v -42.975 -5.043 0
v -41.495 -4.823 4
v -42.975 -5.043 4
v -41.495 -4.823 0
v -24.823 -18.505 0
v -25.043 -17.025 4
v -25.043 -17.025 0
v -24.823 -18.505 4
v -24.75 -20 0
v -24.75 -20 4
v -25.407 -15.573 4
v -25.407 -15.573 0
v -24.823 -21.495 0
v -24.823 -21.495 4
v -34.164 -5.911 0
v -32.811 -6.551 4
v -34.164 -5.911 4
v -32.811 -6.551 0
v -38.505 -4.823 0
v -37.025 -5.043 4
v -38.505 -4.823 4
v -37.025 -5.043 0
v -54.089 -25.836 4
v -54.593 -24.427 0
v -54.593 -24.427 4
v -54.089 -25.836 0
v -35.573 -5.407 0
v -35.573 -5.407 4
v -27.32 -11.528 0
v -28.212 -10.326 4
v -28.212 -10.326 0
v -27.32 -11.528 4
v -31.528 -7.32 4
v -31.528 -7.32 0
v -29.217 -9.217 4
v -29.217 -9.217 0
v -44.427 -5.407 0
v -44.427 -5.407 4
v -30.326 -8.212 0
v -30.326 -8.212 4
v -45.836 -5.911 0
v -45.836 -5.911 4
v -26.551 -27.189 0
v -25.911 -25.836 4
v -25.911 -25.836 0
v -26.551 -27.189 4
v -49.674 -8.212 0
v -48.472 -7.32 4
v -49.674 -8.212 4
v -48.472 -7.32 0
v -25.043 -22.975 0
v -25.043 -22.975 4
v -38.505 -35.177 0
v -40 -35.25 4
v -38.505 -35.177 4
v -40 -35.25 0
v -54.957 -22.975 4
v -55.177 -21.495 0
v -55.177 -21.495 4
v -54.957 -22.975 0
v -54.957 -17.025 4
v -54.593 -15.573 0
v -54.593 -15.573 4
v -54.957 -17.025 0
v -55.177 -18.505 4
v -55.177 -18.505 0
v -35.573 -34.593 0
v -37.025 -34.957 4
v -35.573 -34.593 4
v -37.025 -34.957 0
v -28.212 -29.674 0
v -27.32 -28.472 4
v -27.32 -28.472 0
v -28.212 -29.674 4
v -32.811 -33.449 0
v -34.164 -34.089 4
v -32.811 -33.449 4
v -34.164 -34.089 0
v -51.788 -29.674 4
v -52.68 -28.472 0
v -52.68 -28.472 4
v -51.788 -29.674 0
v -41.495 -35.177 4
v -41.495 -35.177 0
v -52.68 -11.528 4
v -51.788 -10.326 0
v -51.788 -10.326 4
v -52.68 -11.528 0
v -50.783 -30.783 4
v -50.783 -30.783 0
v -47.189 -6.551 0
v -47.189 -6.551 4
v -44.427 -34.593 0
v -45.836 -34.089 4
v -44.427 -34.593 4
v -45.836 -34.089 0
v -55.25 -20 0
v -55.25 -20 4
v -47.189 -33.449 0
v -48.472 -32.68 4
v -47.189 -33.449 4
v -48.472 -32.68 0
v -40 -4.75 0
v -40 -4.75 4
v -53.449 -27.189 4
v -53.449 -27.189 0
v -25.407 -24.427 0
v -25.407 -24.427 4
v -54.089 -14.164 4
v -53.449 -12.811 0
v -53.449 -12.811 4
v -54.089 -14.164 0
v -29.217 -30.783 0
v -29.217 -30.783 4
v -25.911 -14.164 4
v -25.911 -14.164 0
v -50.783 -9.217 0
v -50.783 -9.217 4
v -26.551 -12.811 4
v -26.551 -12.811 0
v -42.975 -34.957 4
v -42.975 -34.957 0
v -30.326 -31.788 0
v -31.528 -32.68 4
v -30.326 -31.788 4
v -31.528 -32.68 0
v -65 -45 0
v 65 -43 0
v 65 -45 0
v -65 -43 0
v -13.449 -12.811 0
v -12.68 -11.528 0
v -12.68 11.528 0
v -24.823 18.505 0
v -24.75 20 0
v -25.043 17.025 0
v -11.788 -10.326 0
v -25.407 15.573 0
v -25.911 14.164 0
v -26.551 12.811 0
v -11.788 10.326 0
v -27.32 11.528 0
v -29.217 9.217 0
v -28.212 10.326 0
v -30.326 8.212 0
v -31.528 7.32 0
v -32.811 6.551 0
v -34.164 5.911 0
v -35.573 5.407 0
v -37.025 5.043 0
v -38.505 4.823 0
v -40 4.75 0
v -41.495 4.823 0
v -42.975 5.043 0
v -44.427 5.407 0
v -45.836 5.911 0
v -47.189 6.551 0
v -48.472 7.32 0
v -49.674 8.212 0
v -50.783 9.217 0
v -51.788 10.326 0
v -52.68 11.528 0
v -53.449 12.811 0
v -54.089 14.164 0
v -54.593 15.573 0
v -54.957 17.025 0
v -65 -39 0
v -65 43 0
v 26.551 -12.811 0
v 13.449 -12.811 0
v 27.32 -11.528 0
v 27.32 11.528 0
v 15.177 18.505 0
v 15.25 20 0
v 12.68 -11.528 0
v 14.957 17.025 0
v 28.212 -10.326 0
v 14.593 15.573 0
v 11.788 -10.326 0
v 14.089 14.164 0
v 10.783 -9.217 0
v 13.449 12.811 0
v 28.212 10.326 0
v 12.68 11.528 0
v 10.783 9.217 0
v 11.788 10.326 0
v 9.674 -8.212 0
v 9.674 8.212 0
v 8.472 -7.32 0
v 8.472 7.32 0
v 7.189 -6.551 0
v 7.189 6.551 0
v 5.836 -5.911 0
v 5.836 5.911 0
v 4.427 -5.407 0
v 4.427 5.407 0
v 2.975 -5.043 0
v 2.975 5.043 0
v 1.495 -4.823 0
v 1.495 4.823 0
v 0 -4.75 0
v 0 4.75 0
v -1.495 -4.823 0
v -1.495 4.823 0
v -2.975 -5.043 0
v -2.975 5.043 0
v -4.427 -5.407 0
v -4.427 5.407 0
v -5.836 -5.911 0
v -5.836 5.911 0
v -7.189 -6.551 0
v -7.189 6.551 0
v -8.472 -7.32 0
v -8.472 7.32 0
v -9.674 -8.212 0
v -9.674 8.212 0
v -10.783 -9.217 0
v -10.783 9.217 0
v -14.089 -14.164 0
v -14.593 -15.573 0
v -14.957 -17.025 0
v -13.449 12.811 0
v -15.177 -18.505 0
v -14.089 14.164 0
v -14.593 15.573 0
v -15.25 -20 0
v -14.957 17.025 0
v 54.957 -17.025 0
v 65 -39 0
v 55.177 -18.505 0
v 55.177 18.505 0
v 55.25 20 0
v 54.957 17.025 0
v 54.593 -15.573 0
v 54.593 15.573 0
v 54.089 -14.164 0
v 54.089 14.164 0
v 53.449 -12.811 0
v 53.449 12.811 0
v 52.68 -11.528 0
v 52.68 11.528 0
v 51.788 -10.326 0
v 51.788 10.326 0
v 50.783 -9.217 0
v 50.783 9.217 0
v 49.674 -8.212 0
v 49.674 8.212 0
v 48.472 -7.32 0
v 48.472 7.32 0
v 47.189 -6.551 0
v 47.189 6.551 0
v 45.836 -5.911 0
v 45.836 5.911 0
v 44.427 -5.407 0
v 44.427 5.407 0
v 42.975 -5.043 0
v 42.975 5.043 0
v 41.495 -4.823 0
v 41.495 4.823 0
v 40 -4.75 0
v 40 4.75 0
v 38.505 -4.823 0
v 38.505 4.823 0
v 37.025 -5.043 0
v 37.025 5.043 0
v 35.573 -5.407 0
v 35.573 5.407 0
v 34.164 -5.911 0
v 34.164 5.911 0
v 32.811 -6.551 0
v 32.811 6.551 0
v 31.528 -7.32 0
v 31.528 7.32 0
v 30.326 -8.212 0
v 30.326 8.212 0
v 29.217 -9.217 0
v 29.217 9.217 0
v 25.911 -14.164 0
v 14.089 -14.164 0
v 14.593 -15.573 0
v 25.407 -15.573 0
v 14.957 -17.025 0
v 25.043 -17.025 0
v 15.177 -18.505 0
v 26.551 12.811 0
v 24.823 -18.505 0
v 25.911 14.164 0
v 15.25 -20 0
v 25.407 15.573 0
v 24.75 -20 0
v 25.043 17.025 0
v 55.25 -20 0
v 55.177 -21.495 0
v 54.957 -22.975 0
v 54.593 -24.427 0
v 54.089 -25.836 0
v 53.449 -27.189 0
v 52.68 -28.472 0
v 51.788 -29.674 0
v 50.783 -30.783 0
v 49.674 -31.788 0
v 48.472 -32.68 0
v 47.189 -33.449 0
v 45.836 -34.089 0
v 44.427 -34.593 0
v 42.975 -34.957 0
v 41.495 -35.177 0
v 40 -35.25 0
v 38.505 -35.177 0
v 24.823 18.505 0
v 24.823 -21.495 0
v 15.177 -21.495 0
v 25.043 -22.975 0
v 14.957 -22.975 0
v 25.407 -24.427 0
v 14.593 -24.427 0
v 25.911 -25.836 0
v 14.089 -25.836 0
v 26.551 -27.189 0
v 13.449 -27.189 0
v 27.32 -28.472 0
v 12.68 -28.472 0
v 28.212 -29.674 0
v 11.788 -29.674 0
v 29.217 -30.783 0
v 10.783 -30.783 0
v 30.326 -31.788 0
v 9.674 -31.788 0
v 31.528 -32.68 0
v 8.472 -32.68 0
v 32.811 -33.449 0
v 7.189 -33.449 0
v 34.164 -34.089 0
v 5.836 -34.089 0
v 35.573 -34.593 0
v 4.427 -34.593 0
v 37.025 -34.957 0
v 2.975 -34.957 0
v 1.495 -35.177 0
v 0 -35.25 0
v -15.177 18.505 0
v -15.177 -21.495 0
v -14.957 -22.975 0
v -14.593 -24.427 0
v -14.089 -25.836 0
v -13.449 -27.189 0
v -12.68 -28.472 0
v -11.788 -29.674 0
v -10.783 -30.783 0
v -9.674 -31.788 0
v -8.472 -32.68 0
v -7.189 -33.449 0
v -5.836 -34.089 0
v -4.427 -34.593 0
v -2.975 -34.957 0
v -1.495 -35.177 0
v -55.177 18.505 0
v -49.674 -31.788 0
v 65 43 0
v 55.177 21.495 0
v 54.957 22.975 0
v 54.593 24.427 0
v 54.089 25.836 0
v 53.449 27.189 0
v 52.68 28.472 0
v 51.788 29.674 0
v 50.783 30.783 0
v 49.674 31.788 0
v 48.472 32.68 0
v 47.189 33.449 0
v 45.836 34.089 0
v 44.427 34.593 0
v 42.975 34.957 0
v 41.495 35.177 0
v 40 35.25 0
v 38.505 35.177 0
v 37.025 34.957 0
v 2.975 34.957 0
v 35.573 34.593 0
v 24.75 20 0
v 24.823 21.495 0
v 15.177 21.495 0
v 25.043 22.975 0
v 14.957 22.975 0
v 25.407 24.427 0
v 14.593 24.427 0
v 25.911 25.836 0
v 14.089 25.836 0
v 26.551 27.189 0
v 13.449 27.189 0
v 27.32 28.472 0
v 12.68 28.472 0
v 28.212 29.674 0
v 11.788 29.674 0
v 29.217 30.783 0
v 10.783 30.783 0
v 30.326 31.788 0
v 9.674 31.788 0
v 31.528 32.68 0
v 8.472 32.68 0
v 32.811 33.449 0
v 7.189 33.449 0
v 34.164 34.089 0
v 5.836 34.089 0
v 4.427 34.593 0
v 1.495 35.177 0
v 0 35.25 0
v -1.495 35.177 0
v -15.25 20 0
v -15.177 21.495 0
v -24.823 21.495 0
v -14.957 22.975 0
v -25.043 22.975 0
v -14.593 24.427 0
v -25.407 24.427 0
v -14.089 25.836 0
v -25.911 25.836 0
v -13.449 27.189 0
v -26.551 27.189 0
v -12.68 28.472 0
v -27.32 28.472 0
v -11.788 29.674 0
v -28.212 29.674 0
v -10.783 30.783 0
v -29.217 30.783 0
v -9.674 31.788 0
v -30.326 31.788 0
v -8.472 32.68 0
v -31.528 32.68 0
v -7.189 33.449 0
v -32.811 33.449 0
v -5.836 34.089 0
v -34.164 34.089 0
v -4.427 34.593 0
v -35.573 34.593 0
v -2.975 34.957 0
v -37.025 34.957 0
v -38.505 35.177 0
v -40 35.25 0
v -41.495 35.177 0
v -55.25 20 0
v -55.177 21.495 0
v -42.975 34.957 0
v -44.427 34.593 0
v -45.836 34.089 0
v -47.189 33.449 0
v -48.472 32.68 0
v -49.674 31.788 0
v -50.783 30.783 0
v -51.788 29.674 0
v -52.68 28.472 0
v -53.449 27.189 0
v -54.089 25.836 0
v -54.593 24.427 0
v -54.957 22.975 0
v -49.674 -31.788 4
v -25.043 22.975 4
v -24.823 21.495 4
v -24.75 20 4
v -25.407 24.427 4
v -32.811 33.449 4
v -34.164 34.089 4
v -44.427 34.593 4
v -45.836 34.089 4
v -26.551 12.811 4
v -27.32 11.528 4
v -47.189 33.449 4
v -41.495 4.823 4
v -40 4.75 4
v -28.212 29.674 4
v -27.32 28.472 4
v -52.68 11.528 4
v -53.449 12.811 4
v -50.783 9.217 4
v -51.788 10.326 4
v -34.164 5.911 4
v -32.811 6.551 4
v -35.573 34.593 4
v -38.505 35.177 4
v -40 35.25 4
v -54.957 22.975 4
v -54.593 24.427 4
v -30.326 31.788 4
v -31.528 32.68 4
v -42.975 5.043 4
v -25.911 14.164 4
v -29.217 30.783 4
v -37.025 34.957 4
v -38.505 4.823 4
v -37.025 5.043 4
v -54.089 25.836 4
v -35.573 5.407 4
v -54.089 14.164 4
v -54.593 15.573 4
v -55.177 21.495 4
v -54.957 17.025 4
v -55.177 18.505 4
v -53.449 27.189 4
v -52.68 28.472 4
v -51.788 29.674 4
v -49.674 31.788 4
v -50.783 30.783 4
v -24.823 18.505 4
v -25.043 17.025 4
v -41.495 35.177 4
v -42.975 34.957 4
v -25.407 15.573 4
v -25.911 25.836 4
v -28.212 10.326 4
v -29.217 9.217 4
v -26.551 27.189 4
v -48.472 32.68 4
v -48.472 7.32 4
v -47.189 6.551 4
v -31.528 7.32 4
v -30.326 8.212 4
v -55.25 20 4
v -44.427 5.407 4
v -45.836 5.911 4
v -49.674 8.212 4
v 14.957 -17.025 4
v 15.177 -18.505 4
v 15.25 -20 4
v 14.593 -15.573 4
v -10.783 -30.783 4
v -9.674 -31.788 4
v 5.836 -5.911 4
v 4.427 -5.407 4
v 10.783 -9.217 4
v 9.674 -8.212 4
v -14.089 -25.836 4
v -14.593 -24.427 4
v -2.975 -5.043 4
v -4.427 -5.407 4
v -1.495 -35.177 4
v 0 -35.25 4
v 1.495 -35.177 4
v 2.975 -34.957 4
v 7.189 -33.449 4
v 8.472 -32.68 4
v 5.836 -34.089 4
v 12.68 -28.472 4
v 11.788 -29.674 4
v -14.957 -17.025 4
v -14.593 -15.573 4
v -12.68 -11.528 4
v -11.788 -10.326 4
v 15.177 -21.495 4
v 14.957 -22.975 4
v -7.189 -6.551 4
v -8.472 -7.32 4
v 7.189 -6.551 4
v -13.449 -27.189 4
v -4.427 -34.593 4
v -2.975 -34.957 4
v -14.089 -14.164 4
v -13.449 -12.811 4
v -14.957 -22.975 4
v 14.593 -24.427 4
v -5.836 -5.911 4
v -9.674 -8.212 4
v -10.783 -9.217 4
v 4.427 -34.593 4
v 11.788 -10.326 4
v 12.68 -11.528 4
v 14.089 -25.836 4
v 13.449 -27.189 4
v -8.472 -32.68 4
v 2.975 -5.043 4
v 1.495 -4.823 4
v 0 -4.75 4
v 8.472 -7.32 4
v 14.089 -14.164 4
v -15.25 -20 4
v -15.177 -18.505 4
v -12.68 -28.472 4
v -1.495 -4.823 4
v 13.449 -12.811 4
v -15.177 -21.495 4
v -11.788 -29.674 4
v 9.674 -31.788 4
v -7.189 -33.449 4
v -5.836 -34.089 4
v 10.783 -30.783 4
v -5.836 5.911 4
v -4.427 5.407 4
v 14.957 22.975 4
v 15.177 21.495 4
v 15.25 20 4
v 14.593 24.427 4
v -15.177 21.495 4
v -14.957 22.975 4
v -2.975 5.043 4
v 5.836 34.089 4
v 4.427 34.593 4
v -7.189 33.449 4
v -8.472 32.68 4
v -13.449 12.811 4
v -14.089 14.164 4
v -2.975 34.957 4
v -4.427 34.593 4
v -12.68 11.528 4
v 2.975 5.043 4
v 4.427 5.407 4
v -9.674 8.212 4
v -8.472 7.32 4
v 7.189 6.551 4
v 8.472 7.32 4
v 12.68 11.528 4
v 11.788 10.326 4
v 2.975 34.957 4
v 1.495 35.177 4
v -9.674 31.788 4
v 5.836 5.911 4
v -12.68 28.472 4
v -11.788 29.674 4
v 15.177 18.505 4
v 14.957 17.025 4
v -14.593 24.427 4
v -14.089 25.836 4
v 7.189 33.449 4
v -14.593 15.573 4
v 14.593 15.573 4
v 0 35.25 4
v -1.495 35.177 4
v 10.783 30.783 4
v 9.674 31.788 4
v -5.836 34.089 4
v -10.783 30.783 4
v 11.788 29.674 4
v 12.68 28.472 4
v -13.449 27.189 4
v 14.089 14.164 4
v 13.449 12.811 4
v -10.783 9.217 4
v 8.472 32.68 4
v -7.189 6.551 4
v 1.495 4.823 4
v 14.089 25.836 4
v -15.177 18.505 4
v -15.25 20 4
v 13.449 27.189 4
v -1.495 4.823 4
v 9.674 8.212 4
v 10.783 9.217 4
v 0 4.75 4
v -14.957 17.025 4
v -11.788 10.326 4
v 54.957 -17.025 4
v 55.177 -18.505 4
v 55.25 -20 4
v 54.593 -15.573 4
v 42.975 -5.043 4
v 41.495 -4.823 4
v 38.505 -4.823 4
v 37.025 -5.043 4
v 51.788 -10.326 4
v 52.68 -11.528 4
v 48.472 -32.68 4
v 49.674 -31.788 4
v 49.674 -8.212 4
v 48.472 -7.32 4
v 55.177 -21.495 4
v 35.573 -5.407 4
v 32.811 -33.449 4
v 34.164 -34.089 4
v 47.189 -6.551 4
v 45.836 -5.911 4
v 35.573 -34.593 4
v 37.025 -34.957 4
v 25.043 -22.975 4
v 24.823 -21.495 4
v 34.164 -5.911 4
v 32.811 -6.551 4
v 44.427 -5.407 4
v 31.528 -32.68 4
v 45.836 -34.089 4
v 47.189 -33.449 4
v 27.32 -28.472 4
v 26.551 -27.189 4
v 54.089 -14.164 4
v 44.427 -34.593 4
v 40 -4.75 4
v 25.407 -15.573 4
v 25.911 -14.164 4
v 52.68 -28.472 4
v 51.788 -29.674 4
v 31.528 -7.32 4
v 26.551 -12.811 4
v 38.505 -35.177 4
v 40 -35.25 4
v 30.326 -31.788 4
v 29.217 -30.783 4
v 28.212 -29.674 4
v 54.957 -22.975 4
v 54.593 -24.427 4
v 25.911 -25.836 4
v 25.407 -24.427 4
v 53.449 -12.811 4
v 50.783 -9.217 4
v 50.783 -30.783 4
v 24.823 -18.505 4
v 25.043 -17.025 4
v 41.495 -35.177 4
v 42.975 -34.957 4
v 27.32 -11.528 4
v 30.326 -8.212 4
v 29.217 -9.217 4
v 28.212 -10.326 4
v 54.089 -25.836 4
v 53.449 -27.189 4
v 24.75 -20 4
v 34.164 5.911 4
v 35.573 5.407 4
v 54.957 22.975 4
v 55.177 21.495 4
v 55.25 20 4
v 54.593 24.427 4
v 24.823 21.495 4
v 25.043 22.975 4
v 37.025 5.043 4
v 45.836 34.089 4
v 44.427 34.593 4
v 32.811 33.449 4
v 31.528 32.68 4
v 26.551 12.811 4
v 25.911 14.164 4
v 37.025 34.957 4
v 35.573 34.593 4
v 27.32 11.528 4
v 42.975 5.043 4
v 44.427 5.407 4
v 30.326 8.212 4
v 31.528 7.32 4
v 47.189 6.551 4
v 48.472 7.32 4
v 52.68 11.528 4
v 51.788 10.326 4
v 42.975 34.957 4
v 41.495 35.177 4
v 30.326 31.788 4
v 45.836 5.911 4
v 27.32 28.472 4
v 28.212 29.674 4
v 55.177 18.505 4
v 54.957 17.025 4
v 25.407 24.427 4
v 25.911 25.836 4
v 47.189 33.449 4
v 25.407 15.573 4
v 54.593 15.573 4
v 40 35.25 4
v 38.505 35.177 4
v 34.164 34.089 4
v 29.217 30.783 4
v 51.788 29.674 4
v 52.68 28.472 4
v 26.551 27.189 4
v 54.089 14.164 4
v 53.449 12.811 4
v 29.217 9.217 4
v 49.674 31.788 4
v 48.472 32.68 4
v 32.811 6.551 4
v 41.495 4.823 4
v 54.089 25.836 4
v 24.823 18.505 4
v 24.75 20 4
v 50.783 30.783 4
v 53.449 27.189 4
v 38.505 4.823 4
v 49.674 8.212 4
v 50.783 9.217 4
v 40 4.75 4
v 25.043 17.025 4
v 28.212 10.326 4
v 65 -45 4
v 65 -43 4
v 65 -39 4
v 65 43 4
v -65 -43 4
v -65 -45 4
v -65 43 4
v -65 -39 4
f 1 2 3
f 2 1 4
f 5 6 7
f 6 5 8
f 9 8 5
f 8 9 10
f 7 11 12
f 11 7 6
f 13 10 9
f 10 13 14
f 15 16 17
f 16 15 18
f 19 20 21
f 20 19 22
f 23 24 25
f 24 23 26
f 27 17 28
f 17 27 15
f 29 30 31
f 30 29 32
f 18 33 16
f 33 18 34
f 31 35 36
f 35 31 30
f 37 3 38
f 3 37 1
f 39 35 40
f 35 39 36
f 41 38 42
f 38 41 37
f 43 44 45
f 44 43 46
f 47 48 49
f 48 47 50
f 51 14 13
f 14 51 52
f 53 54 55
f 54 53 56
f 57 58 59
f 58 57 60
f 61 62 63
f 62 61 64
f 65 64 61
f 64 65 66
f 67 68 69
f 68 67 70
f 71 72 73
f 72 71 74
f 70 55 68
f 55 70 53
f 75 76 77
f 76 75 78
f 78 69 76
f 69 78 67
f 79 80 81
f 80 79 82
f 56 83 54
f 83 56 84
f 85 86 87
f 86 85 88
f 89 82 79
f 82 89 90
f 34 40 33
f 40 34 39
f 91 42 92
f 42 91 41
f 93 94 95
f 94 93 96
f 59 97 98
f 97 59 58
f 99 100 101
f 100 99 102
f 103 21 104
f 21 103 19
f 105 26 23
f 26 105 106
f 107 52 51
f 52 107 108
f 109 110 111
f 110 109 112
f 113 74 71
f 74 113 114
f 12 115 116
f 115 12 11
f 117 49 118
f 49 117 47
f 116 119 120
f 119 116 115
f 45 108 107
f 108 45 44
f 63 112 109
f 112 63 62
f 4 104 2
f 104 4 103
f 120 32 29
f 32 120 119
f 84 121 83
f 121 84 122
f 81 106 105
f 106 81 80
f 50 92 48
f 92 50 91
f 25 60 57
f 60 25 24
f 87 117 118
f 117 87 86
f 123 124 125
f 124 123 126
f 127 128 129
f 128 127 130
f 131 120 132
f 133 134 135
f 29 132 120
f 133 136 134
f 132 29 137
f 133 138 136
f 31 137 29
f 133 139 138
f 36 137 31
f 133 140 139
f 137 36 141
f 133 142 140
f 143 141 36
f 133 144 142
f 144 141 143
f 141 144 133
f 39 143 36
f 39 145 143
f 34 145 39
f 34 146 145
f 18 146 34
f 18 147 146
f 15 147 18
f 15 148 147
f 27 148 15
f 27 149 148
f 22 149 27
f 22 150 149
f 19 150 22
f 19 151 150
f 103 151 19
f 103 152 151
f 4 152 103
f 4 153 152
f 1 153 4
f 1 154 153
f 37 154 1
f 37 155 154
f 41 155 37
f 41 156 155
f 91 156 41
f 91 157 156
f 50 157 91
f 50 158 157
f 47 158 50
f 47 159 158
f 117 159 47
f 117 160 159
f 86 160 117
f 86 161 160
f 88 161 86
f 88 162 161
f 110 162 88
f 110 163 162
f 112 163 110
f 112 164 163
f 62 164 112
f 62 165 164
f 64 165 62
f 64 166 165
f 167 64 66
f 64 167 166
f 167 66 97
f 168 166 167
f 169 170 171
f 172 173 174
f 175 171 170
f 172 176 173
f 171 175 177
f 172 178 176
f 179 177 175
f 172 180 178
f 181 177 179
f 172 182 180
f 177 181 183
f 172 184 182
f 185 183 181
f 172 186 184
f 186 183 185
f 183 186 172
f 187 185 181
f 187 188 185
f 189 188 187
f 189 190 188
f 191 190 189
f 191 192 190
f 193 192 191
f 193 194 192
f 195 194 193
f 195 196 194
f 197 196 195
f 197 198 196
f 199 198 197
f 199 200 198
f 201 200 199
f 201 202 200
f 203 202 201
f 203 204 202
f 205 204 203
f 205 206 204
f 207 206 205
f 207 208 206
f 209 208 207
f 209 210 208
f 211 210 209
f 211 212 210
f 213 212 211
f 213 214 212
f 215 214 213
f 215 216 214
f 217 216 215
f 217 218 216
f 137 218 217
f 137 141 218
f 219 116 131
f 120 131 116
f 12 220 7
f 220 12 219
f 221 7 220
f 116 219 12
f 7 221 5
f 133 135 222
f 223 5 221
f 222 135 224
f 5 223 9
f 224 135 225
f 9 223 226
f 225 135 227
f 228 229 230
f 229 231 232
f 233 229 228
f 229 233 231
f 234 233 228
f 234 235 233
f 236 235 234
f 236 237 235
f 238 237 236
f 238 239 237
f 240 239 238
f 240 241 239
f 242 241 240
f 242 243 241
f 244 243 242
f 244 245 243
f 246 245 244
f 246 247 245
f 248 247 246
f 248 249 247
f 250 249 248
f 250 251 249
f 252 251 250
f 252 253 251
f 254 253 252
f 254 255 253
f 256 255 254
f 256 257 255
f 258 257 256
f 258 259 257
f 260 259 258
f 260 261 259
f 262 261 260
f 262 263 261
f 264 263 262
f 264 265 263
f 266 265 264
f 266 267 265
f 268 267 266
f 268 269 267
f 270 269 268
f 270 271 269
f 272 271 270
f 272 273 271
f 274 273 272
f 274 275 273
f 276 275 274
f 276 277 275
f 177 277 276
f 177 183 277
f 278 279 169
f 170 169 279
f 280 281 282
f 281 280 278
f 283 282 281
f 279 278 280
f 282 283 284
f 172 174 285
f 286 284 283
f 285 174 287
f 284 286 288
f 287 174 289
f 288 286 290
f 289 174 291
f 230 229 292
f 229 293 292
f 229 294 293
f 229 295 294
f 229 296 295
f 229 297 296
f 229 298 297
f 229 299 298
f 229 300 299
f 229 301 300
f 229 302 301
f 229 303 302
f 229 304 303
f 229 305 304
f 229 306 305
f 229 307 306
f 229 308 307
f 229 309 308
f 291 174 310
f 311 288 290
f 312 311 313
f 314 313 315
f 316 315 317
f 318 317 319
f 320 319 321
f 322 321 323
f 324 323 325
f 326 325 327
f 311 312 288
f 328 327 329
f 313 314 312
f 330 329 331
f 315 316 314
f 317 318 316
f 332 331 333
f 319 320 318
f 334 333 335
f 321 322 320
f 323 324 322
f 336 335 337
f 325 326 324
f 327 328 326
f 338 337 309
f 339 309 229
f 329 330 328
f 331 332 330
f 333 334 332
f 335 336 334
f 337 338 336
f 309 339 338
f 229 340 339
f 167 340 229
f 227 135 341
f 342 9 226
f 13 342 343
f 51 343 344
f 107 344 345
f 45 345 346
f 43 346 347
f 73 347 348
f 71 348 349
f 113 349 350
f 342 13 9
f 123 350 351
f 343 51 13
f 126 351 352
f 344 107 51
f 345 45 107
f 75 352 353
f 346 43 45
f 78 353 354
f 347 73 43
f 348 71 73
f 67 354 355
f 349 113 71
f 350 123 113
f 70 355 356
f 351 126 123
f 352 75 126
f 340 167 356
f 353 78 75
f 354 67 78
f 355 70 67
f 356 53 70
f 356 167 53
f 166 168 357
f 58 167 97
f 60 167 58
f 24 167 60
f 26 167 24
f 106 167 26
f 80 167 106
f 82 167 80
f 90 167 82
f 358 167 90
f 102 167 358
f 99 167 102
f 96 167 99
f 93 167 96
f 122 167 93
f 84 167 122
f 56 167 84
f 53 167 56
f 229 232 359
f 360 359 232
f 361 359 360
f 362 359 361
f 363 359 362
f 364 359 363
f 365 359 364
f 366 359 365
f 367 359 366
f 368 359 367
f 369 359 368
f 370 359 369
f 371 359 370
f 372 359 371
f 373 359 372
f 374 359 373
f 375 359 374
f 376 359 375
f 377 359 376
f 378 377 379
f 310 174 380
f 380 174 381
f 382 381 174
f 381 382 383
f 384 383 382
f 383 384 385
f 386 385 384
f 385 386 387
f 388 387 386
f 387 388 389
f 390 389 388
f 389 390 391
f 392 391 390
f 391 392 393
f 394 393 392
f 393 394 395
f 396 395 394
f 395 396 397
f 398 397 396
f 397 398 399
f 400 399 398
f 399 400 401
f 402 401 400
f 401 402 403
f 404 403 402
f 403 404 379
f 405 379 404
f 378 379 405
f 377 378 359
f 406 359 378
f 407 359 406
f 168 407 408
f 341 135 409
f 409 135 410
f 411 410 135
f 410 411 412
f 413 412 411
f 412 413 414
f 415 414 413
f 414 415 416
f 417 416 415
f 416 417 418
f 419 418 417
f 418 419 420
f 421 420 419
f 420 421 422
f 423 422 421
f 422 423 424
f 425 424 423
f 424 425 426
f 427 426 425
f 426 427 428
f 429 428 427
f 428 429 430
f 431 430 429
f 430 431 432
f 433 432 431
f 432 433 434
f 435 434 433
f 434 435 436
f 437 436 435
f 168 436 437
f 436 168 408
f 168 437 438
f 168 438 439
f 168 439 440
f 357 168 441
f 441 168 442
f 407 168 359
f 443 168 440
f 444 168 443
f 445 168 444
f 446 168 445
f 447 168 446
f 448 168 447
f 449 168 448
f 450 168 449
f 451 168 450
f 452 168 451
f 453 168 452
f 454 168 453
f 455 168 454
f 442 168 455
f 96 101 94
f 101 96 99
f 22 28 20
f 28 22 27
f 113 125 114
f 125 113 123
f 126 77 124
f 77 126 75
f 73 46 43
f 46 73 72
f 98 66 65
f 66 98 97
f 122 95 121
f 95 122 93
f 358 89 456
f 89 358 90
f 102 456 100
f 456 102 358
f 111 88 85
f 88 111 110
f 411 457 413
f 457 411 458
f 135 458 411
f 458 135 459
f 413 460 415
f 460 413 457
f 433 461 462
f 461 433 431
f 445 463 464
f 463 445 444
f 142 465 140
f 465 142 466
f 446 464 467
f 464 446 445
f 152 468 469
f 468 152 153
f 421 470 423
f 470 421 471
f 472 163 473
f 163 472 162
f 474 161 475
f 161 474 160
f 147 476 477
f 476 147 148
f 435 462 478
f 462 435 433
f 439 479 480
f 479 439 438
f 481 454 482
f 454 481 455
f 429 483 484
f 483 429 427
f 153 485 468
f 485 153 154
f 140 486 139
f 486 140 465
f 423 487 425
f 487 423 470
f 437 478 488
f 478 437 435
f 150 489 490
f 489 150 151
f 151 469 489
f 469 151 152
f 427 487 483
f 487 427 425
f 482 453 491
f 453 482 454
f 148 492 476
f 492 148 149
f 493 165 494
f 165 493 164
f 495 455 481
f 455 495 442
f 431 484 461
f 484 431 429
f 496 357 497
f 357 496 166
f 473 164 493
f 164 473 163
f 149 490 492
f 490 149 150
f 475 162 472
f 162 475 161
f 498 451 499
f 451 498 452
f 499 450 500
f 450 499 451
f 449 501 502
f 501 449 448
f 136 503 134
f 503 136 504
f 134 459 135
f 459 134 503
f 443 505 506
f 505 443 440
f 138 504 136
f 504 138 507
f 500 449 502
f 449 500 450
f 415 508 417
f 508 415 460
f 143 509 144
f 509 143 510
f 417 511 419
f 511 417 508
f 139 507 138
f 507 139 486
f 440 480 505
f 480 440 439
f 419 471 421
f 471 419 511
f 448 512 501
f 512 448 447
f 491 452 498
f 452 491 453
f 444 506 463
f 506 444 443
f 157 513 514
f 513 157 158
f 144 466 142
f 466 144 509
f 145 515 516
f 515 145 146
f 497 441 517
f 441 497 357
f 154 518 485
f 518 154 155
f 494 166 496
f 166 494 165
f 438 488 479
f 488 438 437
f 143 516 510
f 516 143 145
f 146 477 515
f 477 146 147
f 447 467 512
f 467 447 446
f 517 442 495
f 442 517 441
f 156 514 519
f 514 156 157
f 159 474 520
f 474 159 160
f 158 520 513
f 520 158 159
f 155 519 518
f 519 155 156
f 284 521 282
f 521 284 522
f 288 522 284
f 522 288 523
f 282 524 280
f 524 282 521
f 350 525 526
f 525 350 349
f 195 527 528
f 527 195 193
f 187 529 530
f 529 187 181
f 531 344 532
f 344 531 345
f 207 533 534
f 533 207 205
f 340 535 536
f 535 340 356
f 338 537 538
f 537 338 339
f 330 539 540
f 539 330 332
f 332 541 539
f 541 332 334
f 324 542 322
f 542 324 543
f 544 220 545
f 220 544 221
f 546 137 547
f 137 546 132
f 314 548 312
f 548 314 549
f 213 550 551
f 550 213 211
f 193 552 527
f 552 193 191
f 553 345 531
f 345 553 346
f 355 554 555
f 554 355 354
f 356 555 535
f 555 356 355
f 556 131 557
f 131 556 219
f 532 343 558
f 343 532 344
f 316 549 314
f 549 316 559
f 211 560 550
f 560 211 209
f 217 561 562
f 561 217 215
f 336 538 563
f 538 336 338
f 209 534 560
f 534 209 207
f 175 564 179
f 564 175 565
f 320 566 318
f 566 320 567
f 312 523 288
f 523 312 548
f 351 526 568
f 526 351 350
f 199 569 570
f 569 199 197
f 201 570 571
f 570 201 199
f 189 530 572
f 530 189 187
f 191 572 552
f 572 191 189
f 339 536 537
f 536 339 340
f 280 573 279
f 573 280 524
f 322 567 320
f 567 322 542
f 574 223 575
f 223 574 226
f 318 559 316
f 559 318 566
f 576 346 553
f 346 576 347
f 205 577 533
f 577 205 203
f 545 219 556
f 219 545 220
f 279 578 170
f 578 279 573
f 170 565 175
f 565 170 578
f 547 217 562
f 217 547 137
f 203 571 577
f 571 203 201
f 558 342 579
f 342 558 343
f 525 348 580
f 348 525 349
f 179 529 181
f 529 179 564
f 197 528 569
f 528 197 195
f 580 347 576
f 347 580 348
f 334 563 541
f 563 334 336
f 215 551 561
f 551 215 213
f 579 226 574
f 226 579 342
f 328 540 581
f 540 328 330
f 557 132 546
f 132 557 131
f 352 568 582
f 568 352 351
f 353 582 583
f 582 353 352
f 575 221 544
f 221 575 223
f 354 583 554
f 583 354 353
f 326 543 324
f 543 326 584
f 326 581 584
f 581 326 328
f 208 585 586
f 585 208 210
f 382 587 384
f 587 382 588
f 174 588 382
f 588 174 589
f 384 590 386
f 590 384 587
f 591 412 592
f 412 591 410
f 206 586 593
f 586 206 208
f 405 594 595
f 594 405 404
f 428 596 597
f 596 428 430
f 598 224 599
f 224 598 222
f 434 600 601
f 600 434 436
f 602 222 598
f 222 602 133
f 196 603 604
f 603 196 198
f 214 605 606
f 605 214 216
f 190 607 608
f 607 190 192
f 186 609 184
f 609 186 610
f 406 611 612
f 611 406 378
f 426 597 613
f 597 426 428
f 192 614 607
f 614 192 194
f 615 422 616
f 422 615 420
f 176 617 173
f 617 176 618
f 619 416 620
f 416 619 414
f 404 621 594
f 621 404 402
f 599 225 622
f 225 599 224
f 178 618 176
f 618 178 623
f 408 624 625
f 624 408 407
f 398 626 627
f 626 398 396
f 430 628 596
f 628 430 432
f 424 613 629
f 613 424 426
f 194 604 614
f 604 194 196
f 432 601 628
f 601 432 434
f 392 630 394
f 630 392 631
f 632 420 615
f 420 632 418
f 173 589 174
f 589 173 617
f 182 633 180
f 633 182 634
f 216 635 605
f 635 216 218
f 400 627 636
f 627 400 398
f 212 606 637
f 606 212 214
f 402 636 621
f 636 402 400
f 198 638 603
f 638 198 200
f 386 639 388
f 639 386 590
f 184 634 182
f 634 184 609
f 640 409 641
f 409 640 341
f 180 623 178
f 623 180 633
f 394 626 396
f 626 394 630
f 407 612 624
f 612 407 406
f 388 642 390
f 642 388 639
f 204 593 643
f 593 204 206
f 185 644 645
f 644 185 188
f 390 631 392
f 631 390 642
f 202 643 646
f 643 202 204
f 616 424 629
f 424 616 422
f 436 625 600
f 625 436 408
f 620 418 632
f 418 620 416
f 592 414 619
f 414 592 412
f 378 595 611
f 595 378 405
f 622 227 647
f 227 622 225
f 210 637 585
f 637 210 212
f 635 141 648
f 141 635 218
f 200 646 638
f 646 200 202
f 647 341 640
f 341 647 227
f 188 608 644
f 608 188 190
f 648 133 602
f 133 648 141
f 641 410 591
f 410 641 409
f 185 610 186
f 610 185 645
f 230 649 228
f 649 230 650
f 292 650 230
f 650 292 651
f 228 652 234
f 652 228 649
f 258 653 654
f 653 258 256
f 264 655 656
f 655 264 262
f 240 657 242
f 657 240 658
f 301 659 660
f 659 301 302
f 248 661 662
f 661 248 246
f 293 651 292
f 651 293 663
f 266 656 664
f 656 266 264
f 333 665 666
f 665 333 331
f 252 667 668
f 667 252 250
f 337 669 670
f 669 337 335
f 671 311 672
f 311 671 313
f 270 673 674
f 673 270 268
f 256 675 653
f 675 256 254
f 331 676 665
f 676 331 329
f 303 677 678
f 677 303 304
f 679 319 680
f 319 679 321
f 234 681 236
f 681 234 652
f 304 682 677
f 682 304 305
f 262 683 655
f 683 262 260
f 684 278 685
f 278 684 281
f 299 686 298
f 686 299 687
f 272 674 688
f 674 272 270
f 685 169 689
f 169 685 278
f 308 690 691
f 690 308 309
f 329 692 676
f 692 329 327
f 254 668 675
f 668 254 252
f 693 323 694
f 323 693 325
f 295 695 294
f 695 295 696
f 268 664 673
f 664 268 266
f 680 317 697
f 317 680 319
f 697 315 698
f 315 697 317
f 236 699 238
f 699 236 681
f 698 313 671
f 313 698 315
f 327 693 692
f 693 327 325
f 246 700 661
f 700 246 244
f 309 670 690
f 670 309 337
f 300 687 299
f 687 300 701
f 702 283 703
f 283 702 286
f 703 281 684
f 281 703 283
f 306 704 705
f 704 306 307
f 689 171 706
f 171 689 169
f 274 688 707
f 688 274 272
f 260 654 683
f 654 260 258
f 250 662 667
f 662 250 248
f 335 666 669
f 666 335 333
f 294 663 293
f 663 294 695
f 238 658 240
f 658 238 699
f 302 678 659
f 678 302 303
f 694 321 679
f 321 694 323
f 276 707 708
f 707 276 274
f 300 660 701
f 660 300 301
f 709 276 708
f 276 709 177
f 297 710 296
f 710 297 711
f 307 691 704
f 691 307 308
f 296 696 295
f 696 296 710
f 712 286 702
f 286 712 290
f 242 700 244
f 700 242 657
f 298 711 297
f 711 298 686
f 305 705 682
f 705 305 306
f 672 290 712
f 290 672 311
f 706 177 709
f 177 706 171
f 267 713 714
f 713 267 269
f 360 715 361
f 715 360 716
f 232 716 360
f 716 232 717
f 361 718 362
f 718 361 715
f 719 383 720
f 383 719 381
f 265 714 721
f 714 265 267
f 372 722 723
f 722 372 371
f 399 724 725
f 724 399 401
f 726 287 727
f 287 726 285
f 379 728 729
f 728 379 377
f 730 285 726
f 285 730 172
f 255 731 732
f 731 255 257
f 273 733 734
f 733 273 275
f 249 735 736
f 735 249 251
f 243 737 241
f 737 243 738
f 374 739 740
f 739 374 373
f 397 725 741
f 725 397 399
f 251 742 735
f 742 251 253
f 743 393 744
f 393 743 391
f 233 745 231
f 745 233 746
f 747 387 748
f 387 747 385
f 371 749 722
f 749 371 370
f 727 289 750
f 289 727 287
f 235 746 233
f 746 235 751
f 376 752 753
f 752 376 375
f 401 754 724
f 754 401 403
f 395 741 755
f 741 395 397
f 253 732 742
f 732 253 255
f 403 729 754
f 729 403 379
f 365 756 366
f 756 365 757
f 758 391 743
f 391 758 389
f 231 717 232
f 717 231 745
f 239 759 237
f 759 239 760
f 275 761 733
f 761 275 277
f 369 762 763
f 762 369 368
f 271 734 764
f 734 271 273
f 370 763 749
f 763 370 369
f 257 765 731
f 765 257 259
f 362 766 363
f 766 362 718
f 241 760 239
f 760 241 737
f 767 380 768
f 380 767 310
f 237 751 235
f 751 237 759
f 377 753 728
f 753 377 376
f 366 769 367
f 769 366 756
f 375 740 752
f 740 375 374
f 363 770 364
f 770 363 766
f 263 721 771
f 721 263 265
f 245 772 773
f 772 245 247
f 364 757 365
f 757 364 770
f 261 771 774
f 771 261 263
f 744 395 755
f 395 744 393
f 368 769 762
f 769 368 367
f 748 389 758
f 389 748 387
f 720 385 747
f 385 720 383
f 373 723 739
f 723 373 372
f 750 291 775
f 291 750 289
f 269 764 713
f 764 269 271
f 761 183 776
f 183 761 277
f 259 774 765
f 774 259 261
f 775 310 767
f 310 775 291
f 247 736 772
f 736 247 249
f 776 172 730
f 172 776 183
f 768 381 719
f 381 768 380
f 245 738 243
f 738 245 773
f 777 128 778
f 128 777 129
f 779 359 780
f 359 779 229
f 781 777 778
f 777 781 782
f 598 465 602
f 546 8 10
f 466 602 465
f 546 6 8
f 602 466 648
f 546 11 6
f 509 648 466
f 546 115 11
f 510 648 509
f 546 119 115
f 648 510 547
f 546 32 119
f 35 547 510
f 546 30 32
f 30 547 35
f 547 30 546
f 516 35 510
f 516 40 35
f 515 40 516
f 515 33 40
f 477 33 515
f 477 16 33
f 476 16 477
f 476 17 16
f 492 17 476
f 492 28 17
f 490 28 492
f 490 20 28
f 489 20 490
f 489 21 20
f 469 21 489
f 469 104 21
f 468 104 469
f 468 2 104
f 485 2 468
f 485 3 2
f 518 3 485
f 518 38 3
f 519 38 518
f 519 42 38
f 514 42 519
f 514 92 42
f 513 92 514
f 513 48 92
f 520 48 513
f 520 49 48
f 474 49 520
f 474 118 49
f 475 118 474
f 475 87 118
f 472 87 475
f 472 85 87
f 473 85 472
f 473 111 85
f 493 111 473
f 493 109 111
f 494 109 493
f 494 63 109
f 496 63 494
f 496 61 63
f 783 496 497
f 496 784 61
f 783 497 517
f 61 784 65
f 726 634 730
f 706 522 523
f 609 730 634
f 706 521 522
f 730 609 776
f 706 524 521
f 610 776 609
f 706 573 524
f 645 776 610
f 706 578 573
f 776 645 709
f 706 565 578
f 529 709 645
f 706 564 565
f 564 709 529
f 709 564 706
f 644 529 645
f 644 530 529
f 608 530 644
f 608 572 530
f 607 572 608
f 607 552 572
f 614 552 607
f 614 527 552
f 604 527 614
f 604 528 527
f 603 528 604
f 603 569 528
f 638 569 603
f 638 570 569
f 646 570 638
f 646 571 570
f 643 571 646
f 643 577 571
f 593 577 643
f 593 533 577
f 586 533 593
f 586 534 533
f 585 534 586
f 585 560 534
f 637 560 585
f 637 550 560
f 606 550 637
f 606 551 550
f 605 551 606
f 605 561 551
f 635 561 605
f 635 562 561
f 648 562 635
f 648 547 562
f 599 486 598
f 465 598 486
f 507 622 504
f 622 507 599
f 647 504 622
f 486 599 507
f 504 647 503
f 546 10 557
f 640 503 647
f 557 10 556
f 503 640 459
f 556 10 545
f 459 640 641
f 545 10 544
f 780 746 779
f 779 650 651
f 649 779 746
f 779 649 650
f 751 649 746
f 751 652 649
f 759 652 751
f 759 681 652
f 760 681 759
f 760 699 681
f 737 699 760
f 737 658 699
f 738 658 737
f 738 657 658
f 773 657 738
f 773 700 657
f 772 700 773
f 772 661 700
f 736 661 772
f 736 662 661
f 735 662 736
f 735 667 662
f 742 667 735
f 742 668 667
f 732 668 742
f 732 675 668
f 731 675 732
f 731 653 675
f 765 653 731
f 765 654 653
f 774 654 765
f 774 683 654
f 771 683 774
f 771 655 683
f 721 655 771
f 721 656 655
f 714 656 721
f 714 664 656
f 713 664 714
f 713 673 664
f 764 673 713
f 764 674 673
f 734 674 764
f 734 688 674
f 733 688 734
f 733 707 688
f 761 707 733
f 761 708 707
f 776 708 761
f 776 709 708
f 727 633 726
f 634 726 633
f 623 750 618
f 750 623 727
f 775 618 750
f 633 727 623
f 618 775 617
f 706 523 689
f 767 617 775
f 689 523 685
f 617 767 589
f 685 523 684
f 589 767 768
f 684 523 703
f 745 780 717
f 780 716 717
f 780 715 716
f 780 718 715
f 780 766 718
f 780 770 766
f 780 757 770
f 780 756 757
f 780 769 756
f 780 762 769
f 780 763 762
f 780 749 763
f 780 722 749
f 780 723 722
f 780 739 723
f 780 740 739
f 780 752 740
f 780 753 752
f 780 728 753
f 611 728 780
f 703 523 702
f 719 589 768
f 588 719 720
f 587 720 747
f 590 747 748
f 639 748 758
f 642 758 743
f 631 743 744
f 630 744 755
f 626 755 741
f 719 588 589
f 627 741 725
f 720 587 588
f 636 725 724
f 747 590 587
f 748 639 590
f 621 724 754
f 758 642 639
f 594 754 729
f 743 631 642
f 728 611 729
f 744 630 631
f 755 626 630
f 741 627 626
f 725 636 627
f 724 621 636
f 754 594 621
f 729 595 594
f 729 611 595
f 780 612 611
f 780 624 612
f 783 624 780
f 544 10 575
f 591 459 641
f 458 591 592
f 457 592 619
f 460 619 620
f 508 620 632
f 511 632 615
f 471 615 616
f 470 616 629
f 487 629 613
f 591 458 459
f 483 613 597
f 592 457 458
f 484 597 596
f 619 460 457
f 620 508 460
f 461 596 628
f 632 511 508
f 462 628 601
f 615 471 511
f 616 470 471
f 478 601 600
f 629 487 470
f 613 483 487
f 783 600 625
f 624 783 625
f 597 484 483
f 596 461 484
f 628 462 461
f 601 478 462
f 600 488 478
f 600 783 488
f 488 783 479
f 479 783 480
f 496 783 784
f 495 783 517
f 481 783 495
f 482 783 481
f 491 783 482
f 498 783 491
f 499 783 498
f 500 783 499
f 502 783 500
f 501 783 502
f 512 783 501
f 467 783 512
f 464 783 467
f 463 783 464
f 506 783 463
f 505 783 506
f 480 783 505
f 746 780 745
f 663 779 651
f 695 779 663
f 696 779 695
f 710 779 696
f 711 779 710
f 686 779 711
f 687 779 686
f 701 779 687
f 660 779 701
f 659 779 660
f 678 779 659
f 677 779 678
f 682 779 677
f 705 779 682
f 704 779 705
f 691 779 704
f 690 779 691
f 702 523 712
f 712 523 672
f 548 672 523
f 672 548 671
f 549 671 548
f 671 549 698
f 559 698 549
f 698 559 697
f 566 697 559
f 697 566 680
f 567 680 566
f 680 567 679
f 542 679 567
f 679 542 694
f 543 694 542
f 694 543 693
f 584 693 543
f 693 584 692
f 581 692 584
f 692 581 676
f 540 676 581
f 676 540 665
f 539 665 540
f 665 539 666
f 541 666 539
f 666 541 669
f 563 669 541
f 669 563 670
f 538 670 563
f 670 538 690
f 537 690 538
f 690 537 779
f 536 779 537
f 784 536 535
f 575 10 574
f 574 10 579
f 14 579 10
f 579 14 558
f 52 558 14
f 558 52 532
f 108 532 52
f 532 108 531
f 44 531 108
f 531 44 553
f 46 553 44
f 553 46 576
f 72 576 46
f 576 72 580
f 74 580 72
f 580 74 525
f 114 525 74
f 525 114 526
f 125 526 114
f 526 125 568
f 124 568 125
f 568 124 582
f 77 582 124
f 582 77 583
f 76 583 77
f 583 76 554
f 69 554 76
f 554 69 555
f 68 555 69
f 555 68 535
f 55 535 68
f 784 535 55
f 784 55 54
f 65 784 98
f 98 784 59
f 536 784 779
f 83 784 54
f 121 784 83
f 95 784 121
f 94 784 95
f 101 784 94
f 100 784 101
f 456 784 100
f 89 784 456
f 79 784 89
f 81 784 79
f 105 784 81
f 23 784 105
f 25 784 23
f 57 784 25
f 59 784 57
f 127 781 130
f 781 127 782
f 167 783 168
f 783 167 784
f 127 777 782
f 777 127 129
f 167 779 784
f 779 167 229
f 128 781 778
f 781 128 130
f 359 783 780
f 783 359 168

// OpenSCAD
// Rack for six 50 mL conical (Falcon-type) tubes.
// Print orientation: Flat plate on bed (z=0), walls rising to z=70.
// After printing, flip over so walls stand on the bed and tubes hang down.

// Plate dimensions
L     = 130; // Length (X)
W     = 90;  // Width (Y)
t_plate = 4; // Plate thickness (Z)

// Hole specifications
n_rows = 2; // Rows along Y
n_cols = 3; // Columns along X
hole_d = 30.5; // Hole diameter
pitch_x = 40; // Centre-to-centre spacing X
pitch_y = 40; // Centre-to-centre spacing Y

// Wall specifications
wall_h = 70; // Wall height (from plate top)
wall_t = 4;  // Wall thickness (Y)

// Derived positions (centred on origin)
// X positions: -40, 0, 40 (3 holes with 40mm pitch centred)
// Y positions: -20, 20 (2 holes with 40mm pitch centred)

// Generate hole coordinates using list comprehension
hole_x = [for (i = [0 : n_cols - 1]) (i - (n_cols - 1) / 2) * pitch_x];
hole_y = [for (i = [0 : n_rows - 1]) (i - (n_rows - 1) / 2) * pitch_y];

$fn = 64;

difference() {
    // 1. The main flat plate
    translate([-L / 2, -W / 2, 0]) 
        cube([L, W, t_plate]);

    // 2. The two long side walls
    // Left wall (at Y = -W/2 + wall_t/2)
    translate([-L / 2, -W / 2 + wall_t / 2, 0]) 
        cube([L, wall_t, wall_h]);
    
    // Right wall (at Y = W/2 - wall_t/2)
    translate([-L / 2, W / 2 - wall_t / 2, 0]) 
        cube([L, wall_t, wall_h]);

    // 3. The through-holes
    for (x = hole_x) {
        for (y = hole_y) {
            translate([x, y, 0]) 
                cylinder(h = t_plate + wall_h + 2, d = hole_d); // Extend past walls to ensure clean cut
        }
    }
}
